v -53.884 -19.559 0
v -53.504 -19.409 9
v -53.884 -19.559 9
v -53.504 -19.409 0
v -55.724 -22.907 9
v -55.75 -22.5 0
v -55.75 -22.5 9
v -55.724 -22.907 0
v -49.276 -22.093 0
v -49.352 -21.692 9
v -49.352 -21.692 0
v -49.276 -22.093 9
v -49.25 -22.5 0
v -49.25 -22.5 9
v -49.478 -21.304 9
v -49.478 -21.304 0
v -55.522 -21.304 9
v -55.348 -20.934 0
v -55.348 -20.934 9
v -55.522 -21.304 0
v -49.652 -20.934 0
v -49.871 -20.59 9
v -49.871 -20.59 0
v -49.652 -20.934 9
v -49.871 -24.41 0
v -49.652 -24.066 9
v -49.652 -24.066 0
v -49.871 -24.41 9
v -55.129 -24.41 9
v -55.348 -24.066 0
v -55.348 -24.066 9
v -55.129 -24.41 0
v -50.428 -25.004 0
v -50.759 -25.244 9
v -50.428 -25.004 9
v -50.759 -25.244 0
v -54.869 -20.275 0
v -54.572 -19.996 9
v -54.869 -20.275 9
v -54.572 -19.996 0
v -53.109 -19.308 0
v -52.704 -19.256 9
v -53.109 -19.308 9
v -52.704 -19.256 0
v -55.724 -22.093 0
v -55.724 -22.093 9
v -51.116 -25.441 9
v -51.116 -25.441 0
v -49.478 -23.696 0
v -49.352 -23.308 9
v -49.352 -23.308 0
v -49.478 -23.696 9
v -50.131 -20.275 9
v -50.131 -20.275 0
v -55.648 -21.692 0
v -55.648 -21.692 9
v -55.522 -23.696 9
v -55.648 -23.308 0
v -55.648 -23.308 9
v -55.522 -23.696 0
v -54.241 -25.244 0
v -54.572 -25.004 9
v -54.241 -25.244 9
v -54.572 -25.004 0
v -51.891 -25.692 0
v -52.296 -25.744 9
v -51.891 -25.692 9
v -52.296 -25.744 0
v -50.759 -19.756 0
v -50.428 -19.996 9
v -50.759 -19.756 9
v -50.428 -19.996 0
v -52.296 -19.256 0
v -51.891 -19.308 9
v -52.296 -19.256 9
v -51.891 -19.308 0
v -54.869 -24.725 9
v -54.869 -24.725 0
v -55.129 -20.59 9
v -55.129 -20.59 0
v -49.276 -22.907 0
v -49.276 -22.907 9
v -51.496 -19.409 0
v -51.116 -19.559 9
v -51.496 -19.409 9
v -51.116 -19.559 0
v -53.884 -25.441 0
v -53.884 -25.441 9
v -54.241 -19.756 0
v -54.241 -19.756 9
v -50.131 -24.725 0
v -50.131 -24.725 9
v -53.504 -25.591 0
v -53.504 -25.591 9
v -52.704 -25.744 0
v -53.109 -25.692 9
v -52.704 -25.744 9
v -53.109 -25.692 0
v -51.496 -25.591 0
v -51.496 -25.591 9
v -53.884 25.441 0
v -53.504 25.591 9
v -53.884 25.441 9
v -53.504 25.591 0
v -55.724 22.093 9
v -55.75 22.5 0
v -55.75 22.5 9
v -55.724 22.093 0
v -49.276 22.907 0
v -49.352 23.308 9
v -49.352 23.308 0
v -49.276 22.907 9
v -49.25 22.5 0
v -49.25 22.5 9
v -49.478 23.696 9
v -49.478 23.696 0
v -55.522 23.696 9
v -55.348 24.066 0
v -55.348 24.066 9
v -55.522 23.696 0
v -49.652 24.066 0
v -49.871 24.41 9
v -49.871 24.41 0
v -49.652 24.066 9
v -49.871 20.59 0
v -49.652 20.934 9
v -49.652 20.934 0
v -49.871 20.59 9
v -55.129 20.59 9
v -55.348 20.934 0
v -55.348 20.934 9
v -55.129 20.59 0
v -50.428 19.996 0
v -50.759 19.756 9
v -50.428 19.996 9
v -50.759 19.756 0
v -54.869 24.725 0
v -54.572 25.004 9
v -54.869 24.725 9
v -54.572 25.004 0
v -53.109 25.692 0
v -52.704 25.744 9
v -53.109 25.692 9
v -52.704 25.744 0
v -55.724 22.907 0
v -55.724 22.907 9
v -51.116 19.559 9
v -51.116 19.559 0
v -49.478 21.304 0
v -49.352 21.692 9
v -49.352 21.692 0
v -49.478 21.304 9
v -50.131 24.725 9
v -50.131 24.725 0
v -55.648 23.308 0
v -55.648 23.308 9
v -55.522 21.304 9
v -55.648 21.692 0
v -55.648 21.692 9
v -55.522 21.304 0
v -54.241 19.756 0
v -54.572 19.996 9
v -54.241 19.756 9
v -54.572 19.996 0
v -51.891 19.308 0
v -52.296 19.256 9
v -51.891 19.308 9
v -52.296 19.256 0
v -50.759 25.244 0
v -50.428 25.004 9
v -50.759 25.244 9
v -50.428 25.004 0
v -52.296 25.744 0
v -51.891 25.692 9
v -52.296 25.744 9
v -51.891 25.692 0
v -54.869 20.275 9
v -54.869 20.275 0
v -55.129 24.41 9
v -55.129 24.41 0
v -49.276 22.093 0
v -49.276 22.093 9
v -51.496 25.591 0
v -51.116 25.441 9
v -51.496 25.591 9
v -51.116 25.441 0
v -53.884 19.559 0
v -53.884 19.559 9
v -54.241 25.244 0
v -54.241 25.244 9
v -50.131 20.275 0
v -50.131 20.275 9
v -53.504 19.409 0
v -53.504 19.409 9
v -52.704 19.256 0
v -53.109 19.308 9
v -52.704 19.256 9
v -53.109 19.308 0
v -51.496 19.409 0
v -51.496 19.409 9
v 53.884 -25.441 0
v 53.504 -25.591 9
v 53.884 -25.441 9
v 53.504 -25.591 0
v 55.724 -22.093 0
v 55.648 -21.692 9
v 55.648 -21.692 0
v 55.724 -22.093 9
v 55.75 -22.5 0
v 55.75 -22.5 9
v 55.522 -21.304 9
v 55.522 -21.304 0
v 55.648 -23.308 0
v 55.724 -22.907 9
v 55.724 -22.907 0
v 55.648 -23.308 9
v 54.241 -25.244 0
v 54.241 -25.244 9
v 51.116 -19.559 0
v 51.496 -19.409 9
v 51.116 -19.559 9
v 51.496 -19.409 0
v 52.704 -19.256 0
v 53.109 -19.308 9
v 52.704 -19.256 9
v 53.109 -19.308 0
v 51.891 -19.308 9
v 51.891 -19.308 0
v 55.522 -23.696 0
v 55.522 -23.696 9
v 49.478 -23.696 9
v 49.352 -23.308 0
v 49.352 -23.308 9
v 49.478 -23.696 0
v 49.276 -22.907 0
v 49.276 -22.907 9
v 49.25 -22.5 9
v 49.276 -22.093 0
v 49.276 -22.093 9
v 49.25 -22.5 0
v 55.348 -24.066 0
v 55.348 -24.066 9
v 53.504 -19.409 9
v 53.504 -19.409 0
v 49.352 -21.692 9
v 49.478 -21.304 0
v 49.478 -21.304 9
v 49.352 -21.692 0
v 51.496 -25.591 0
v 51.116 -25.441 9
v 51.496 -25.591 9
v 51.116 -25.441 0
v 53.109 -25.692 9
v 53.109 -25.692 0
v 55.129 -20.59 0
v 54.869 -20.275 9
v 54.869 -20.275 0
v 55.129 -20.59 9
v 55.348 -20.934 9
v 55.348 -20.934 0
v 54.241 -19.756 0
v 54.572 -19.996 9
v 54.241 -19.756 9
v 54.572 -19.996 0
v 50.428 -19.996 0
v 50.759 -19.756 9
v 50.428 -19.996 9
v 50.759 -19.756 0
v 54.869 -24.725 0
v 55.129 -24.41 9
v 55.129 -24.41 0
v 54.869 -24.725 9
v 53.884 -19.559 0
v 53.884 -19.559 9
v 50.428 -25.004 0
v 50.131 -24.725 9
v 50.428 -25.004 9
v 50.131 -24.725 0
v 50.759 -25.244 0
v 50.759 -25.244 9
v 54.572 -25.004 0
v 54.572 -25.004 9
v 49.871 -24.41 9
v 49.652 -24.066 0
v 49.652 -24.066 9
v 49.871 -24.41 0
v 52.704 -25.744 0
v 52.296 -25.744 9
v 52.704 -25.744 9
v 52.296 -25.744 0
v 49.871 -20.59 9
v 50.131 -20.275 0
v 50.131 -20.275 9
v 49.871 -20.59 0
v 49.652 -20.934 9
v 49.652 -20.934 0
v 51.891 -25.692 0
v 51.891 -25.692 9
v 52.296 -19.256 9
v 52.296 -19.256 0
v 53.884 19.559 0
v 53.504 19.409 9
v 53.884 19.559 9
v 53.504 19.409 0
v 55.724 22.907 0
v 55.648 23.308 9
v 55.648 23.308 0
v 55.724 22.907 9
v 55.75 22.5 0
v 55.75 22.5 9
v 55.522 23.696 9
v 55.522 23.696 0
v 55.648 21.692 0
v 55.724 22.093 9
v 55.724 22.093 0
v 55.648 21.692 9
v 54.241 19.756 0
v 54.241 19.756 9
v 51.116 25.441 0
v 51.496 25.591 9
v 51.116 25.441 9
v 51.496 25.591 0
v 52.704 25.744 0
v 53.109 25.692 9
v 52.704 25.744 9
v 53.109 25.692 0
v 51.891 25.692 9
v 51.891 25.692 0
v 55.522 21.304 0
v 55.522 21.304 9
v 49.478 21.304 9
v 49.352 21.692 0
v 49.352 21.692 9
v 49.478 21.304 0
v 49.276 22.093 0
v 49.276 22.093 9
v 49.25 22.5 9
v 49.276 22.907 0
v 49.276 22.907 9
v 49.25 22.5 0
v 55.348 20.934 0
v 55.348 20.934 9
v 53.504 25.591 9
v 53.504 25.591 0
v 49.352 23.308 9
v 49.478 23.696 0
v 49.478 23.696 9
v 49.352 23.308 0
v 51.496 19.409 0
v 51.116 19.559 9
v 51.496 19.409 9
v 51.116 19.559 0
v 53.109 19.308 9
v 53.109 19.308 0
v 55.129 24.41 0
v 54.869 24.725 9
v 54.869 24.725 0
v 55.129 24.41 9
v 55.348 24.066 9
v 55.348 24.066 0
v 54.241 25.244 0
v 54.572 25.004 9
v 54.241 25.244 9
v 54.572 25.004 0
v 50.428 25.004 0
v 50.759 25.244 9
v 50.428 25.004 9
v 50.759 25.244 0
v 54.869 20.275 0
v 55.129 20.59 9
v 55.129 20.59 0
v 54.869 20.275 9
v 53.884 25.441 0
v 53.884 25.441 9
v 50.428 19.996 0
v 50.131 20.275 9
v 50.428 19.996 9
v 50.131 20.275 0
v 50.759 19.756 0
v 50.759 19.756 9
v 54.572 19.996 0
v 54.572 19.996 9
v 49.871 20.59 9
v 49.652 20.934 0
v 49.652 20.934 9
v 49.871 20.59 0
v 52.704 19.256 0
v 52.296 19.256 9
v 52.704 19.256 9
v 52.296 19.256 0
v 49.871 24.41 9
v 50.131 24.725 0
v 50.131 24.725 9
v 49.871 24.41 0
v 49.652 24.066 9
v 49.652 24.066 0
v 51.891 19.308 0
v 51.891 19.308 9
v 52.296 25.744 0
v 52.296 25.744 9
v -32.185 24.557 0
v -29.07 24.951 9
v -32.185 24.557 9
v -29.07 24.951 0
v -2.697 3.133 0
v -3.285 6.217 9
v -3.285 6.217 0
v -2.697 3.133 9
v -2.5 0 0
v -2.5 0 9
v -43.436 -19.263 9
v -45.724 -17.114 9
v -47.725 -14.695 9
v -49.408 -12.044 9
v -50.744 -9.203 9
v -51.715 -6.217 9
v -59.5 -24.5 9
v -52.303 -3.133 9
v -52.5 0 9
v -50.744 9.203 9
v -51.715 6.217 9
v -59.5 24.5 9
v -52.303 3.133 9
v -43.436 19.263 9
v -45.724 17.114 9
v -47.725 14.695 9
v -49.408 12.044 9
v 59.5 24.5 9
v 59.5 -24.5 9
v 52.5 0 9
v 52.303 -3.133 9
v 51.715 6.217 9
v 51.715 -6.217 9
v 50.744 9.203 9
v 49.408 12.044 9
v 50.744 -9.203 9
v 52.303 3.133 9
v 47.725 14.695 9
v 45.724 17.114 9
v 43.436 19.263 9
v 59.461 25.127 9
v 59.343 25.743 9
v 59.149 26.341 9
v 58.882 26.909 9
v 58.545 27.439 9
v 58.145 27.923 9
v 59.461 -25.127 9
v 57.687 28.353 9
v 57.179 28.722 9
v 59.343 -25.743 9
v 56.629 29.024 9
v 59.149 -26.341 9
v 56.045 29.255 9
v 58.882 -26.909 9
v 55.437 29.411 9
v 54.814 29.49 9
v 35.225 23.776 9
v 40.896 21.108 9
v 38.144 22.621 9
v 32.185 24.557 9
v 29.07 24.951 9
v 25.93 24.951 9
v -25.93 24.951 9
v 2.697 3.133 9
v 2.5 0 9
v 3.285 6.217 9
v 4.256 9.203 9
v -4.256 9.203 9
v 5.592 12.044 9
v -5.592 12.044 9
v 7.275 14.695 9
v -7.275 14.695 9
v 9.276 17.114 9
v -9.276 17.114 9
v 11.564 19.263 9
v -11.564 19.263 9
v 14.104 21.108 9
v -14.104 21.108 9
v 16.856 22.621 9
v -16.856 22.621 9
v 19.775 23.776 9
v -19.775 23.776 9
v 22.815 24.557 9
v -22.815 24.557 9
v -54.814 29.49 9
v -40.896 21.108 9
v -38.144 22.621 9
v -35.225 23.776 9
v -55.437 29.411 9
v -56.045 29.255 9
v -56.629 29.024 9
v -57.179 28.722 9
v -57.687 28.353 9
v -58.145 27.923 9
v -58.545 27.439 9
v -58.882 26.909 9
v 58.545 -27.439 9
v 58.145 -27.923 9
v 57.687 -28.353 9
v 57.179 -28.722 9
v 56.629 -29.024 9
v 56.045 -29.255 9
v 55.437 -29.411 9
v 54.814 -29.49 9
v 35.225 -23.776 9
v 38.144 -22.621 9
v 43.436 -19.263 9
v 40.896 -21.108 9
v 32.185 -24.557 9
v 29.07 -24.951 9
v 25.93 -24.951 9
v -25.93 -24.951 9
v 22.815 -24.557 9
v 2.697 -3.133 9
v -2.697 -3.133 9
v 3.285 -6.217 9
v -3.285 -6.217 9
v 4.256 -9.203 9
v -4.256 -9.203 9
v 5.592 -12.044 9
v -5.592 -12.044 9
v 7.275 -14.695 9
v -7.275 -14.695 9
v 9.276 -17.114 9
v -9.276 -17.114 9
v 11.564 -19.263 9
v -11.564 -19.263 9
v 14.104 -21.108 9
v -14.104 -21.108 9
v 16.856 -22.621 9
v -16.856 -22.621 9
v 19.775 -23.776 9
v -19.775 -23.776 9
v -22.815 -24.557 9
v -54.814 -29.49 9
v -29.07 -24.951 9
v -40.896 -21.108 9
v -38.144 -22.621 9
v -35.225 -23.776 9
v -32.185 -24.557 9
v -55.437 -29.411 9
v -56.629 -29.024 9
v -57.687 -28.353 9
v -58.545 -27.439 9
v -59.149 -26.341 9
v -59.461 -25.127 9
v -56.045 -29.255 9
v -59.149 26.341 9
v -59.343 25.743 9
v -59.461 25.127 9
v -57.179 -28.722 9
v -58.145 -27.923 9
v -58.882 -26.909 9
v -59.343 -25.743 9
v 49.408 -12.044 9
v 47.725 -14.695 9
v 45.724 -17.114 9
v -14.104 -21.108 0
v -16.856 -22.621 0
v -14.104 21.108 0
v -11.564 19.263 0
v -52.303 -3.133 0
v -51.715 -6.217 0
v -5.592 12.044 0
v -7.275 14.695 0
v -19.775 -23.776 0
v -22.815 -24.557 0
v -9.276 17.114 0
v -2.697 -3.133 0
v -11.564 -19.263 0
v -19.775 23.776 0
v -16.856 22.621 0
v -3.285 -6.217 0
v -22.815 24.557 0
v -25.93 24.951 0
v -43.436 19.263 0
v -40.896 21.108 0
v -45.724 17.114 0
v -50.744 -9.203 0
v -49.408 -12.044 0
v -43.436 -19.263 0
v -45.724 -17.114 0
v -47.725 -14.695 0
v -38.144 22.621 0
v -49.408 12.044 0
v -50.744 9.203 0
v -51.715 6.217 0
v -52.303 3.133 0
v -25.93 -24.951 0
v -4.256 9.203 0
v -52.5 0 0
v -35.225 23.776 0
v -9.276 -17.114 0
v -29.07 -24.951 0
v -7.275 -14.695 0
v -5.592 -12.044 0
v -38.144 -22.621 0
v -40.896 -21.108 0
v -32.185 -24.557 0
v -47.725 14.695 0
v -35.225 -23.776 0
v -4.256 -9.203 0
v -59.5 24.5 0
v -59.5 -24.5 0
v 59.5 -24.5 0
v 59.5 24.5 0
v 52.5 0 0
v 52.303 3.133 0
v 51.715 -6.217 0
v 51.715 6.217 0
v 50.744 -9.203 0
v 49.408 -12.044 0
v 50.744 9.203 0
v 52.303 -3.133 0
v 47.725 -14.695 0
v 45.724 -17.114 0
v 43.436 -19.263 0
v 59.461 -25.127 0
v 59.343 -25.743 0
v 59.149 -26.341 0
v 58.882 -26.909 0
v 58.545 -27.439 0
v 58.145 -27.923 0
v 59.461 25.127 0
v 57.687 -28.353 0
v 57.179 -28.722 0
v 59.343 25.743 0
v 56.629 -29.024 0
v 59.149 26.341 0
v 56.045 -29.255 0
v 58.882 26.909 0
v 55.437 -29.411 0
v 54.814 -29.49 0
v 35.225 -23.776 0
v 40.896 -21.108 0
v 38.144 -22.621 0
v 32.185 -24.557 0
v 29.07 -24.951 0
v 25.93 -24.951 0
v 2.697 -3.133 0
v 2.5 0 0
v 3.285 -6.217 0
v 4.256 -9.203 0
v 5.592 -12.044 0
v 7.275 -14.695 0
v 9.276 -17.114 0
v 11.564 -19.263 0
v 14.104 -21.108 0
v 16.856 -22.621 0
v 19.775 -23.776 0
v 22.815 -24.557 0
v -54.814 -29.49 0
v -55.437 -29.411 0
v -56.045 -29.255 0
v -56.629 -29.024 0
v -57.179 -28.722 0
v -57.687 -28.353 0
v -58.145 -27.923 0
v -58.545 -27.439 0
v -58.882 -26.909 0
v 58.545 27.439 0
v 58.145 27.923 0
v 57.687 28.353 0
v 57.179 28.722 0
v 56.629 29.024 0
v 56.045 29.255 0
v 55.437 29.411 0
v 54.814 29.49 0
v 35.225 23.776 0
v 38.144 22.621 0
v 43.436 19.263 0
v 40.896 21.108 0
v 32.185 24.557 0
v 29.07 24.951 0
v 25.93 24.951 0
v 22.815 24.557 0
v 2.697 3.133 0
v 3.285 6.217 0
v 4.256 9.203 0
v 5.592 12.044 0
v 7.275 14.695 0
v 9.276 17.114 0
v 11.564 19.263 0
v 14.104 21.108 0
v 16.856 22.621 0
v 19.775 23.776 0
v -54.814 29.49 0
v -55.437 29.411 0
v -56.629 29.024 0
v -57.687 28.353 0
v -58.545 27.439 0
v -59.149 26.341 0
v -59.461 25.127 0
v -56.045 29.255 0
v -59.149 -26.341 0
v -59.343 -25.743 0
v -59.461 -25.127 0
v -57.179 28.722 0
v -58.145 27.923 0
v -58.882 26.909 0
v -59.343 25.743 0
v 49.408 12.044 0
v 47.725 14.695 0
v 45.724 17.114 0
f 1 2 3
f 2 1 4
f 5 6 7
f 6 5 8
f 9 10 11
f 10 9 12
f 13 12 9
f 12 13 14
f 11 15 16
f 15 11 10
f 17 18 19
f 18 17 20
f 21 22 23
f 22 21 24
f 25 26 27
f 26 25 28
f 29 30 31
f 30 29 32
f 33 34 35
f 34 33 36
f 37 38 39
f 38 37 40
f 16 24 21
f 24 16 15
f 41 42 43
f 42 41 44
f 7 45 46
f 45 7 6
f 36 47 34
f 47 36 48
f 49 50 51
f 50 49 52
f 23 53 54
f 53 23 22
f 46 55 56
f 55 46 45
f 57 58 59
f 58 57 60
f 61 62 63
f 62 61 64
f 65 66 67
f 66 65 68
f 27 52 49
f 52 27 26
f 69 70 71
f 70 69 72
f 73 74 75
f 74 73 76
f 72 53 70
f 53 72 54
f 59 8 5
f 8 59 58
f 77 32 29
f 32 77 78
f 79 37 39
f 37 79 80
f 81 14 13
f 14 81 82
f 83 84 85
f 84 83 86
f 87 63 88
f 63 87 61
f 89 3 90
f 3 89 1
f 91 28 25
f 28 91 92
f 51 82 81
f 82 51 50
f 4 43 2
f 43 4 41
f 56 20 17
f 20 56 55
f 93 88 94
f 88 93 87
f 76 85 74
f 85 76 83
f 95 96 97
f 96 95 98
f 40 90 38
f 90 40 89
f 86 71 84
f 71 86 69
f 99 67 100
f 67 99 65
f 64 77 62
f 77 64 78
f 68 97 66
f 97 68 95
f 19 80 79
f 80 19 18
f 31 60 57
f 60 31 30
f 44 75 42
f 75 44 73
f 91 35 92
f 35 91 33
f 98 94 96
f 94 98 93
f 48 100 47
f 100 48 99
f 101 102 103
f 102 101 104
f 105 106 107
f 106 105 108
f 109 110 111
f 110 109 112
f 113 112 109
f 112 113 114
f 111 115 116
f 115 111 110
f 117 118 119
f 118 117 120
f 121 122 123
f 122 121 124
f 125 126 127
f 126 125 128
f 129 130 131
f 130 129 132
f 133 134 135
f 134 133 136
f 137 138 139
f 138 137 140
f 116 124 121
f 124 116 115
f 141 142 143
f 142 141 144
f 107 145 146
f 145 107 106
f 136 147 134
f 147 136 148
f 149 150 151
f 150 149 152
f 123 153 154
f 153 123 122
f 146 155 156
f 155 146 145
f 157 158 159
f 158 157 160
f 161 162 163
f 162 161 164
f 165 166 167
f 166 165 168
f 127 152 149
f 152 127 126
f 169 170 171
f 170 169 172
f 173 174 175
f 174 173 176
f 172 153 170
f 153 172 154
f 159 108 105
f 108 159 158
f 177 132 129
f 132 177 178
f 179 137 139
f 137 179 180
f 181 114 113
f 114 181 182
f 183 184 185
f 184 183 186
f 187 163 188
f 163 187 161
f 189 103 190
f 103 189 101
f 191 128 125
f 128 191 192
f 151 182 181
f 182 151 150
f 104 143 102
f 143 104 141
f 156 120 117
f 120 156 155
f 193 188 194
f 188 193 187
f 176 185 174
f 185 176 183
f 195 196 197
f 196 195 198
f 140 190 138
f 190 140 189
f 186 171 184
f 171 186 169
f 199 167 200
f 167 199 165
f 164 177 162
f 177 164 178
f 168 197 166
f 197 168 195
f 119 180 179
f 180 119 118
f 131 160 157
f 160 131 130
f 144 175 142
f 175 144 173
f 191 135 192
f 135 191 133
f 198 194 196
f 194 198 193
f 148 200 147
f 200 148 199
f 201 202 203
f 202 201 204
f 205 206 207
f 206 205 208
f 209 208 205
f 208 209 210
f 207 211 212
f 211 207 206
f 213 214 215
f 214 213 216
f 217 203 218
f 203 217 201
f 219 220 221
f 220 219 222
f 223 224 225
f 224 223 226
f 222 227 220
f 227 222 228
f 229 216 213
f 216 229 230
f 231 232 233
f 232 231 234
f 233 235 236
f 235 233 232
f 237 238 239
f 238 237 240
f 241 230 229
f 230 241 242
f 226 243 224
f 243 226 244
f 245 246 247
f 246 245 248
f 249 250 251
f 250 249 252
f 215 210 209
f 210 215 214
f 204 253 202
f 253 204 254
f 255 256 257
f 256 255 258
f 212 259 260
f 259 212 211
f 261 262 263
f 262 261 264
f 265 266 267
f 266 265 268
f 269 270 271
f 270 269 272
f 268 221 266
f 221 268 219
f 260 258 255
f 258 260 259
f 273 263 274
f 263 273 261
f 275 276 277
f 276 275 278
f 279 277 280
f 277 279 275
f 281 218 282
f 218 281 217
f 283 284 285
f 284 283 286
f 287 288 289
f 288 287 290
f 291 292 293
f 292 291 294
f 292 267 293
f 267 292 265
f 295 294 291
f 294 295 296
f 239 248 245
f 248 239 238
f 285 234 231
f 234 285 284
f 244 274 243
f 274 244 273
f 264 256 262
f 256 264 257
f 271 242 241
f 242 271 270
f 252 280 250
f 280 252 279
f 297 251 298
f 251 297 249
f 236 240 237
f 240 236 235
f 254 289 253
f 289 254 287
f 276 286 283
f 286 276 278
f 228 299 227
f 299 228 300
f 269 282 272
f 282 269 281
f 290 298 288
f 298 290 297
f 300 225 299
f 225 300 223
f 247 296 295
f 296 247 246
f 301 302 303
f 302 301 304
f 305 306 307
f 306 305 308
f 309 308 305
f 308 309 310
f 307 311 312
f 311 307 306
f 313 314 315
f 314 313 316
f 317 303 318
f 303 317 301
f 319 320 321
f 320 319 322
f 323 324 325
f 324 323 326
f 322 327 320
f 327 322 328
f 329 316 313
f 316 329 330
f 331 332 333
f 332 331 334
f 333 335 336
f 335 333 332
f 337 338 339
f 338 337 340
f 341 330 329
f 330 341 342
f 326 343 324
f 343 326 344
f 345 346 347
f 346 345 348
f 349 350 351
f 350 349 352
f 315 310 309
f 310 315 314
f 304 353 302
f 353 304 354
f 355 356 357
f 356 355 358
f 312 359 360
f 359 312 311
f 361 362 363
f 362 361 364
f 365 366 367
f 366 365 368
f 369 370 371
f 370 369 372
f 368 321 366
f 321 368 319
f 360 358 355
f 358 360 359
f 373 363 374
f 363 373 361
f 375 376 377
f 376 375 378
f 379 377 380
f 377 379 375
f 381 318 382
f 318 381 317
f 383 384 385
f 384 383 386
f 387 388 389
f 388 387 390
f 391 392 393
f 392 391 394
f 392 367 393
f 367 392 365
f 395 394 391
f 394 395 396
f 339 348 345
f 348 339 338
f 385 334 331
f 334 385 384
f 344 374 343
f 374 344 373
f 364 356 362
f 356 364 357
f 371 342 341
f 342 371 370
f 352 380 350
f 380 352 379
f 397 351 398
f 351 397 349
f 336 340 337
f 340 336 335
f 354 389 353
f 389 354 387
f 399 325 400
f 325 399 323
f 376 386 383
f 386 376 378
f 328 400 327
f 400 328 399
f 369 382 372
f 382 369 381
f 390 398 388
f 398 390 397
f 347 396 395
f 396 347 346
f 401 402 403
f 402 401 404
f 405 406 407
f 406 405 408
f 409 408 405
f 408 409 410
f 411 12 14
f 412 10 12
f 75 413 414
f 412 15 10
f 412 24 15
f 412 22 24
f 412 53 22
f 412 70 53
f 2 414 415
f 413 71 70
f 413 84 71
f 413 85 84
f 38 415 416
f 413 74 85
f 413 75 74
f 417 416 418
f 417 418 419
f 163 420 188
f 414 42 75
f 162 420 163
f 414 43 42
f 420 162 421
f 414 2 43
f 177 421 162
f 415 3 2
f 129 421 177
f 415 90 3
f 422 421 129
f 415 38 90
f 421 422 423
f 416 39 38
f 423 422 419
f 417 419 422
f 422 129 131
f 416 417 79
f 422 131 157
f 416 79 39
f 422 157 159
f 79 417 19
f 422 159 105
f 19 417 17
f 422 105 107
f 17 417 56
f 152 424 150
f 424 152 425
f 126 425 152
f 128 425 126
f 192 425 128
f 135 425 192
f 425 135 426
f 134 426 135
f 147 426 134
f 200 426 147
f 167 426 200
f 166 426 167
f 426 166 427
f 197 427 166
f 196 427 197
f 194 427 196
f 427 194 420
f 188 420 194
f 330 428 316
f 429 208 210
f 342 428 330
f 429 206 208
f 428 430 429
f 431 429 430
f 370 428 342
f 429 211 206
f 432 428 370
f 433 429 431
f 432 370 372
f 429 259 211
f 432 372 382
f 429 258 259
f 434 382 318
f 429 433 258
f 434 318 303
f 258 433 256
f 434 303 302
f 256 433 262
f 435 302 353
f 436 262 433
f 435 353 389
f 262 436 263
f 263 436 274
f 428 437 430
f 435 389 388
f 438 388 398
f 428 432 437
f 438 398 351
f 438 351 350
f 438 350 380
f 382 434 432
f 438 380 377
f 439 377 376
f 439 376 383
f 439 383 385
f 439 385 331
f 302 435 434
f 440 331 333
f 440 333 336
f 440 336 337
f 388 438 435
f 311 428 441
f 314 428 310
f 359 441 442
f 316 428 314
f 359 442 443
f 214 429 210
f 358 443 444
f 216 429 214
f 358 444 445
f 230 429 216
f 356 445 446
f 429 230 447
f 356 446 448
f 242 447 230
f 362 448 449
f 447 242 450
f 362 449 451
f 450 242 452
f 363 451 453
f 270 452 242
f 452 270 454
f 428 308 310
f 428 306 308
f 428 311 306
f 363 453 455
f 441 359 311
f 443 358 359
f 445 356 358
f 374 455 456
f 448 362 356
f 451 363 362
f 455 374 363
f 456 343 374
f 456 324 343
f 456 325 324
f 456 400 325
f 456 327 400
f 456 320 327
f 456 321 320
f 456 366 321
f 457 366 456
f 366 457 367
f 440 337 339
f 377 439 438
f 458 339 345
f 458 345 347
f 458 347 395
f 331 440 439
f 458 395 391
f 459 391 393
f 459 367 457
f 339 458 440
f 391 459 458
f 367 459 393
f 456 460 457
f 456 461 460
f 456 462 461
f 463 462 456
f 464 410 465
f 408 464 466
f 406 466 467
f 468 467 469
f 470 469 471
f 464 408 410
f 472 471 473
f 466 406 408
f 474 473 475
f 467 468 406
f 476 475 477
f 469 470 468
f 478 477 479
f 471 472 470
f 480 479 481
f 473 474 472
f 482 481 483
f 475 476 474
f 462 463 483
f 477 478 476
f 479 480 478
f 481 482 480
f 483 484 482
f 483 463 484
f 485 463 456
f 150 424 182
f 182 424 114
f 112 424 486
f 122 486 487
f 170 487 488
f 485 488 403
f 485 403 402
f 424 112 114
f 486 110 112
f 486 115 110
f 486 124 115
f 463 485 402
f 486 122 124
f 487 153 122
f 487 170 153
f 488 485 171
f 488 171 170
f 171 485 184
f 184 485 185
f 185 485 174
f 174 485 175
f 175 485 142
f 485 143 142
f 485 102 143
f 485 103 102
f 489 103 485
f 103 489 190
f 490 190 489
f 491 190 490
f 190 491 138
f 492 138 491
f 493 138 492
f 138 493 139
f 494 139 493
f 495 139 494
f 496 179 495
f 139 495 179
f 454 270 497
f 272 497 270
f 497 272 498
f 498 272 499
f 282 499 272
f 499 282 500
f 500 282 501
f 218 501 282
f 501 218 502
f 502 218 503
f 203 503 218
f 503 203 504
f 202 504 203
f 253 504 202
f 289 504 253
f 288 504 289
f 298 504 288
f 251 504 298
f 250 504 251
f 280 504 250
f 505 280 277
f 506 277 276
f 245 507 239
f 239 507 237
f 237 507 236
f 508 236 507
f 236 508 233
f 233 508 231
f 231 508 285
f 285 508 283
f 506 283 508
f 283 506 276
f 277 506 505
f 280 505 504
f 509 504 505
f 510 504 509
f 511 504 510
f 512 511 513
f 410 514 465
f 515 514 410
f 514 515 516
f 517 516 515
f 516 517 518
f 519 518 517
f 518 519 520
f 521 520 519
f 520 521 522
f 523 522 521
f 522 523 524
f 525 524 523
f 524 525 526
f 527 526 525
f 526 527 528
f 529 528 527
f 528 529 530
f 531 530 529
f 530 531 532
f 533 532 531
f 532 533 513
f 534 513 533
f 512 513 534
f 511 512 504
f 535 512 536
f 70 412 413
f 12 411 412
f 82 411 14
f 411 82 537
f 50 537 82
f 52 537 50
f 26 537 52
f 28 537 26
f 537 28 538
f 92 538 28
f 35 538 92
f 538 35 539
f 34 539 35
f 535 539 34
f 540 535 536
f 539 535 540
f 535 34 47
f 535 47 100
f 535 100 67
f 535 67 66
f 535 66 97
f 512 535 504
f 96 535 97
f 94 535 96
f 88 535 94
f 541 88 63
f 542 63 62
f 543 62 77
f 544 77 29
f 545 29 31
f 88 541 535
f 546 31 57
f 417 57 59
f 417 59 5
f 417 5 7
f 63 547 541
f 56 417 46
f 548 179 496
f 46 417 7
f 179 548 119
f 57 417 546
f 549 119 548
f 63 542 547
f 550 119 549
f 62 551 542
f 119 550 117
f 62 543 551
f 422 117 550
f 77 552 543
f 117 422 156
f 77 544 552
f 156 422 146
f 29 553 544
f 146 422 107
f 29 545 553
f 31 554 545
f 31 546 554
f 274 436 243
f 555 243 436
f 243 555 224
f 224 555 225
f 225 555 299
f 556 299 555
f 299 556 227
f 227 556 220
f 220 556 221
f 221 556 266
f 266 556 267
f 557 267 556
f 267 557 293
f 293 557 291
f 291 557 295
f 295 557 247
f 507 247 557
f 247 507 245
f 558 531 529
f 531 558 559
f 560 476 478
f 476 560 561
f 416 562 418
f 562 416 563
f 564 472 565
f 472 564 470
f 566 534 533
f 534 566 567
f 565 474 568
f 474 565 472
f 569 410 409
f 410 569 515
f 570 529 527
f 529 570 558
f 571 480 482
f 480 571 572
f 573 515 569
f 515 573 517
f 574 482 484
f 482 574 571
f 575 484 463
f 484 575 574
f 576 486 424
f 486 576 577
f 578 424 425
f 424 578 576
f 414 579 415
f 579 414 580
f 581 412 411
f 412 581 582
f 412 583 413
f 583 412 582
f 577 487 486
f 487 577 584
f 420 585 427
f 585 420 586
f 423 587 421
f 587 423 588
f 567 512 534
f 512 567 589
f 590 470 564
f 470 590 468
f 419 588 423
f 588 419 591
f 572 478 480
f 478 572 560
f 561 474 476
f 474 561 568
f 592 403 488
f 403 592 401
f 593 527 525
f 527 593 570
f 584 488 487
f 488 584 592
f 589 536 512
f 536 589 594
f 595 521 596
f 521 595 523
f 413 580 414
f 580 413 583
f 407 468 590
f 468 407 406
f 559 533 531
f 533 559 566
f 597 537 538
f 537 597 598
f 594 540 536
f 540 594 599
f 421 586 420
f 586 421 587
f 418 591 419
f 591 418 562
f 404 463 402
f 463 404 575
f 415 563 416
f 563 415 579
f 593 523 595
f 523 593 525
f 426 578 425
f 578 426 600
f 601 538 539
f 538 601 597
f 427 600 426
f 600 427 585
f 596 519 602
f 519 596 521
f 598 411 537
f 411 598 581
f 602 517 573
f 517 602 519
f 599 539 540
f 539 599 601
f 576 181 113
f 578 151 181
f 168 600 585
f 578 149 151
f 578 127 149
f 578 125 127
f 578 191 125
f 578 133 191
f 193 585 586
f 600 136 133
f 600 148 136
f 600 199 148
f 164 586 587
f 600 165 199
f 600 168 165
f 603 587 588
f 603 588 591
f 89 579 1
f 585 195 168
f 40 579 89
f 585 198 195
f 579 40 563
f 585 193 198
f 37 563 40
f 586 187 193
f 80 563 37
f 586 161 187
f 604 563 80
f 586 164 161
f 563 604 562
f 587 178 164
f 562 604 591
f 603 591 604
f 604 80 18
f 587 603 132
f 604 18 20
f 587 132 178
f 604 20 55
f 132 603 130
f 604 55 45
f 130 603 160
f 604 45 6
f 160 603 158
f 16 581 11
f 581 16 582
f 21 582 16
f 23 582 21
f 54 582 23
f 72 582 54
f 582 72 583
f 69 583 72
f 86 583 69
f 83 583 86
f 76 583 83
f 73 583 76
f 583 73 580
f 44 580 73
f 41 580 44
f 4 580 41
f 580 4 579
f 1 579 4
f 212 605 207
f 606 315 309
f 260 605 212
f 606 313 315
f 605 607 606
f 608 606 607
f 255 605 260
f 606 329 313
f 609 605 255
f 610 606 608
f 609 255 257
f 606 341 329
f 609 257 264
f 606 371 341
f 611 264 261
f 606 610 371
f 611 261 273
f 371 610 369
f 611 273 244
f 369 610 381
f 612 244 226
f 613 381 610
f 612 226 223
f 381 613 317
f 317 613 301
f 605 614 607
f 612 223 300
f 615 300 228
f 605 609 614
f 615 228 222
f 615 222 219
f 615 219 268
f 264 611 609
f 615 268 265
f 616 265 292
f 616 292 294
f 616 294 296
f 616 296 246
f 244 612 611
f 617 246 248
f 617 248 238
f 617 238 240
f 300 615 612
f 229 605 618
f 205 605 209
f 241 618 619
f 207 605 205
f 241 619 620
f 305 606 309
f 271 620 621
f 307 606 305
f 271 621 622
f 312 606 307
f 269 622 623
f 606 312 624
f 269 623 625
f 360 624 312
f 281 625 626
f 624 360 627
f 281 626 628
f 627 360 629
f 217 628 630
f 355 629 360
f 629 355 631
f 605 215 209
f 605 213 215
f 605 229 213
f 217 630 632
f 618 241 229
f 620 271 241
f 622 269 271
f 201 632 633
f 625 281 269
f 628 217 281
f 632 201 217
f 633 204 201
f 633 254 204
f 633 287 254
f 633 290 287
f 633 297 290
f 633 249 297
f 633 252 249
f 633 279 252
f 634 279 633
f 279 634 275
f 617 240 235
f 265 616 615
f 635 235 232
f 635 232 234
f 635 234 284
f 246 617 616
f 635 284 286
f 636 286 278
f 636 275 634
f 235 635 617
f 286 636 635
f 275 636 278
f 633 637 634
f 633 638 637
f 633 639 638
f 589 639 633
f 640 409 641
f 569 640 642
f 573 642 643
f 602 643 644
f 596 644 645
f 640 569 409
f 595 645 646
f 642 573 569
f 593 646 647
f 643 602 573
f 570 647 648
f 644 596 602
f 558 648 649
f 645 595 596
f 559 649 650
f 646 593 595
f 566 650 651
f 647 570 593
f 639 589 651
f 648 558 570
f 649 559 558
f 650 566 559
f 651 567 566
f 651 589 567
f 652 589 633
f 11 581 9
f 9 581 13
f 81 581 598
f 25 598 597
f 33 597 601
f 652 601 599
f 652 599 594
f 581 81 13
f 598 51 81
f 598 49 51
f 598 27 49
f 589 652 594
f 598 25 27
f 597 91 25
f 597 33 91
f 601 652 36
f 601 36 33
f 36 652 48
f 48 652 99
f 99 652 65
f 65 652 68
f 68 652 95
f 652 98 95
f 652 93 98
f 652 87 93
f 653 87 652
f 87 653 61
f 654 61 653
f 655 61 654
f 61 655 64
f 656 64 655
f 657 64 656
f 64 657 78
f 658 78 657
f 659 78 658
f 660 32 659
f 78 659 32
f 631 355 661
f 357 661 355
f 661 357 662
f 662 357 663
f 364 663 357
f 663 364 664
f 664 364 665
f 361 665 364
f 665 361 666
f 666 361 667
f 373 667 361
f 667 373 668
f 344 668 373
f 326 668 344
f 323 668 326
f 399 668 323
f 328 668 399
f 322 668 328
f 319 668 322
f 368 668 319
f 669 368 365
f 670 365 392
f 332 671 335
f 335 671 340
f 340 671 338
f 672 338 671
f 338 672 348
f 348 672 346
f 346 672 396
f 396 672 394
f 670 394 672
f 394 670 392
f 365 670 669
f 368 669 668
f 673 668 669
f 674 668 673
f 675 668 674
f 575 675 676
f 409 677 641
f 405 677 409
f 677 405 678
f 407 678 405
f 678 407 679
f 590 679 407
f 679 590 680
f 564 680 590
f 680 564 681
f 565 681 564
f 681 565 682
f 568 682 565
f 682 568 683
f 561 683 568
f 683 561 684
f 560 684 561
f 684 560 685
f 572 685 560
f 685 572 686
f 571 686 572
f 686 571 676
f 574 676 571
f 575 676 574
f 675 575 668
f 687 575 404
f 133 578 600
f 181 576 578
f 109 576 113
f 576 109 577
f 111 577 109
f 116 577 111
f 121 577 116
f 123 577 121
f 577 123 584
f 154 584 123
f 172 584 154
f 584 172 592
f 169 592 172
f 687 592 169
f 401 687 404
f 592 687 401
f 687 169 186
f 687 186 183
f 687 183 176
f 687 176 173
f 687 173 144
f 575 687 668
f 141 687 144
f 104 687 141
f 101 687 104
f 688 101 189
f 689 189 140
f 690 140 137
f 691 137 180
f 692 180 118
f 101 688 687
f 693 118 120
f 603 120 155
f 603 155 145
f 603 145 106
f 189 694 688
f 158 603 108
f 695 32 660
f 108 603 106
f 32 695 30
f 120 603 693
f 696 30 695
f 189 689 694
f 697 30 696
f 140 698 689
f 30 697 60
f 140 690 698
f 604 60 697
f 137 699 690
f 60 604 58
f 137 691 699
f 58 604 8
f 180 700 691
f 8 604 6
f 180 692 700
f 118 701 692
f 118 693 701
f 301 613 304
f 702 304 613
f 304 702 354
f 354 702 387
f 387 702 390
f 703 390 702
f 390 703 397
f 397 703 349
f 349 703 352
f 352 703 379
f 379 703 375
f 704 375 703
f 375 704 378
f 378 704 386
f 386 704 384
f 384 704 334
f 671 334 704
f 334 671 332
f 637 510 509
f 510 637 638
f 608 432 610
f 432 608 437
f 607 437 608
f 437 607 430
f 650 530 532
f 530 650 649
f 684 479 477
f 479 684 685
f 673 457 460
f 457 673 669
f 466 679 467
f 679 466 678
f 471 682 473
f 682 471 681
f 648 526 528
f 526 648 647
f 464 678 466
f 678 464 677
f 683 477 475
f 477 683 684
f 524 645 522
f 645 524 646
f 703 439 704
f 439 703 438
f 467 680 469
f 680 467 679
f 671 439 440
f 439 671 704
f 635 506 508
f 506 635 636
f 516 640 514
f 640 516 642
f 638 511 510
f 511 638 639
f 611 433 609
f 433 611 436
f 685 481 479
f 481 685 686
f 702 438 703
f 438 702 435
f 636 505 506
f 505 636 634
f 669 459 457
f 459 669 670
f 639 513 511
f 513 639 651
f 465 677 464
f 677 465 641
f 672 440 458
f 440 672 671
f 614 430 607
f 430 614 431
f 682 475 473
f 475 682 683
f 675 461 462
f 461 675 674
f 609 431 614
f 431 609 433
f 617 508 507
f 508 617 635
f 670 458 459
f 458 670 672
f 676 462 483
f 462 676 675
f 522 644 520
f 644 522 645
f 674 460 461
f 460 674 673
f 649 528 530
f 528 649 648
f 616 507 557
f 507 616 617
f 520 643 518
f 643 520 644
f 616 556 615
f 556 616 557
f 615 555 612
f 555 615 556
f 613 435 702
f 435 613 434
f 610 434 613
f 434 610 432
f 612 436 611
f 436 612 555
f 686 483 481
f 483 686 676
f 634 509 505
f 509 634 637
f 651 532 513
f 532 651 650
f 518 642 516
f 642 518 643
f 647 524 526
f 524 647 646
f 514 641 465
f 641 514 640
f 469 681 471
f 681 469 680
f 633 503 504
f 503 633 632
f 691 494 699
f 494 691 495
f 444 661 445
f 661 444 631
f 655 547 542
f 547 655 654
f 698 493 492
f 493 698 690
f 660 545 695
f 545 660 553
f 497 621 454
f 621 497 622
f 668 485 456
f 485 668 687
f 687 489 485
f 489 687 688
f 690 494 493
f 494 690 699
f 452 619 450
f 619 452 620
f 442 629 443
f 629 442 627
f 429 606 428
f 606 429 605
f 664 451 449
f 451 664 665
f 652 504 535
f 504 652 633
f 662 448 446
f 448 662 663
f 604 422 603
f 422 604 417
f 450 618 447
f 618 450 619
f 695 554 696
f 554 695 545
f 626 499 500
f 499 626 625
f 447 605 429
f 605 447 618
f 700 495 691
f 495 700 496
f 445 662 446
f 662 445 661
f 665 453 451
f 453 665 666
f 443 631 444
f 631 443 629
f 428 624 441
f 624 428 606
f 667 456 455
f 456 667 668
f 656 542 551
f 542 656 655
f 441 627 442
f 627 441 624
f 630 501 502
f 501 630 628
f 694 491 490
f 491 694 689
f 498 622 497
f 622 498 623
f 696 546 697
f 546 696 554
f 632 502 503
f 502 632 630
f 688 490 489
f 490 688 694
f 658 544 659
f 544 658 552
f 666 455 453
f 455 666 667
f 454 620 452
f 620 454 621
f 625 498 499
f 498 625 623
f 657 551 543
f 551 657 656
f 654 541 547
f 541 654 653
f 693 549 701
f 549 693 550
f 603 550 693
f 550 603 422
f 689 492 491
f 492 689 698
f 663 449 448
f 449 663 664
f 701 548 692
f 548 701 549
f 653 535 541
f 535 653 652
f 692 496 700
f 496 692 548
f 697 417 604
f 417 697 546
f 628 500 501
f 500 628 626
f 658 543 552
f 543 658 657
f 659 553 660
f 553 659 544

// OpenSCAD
$fn = 50;

difference() {
	union() {
		hull() {
			translate(v = [-54.5, 24.5, 0]) {
				cylinder(h = 9, r = 5);
			}
			translate(v = [54.5, 24.5, 0]) {
				cylinder(h = 9, r = 5);
			}
			translate(v = [-54.5, -24.5, 0]) {
				cylinder(h = 9, r = 5);
			}
			translate(v = [54.5, -24.5, 0]) {
				cylinder(h = 9, r = 5);
			}
		}
	}
	union() {
		translate(v = [-52.5, -22.5, -100.0]) {
			cylinder(h = 200, r = 3.25);
		}
		translate(v = [-52.5, 22.5, -100.0]) {
			cylinder(h = 200, r = 3.25);
		}
		translate(v = [52.5, -22.5, -100.0]) {
			cylinder(h = 200, r = 3.25);
		}
		translate(v = [52.5, 22.5, -100.0]) {
			cylinder(h = 200, r = 3.25);
		}
		translate(v = [-52.5, -22.5, -100.0]) {
			cylinder(h = 200, r = 1.8);
		}
		translate(v = [-52.5, 22.5, -100.0]) {
			cylinder(h = 200, r = 1.8);
		}
		translate(v = [52.5, -22.5, -100.0]) {
			cylinder(h = 200, r = 1.8);
		}
		translate(v = [52.5, 22.5, -100.0]) {
			cylinder(h = 200, r = 1.8);
		}
		translate(v = [-27.5, 0, 0.0]) {
			cylinder(h = 9, r = 25.0);
		}
		translate(v = [27.5, 0, 0.0]) {
			cylinder(h = 9, r = 25.0);
		}
	}
}
